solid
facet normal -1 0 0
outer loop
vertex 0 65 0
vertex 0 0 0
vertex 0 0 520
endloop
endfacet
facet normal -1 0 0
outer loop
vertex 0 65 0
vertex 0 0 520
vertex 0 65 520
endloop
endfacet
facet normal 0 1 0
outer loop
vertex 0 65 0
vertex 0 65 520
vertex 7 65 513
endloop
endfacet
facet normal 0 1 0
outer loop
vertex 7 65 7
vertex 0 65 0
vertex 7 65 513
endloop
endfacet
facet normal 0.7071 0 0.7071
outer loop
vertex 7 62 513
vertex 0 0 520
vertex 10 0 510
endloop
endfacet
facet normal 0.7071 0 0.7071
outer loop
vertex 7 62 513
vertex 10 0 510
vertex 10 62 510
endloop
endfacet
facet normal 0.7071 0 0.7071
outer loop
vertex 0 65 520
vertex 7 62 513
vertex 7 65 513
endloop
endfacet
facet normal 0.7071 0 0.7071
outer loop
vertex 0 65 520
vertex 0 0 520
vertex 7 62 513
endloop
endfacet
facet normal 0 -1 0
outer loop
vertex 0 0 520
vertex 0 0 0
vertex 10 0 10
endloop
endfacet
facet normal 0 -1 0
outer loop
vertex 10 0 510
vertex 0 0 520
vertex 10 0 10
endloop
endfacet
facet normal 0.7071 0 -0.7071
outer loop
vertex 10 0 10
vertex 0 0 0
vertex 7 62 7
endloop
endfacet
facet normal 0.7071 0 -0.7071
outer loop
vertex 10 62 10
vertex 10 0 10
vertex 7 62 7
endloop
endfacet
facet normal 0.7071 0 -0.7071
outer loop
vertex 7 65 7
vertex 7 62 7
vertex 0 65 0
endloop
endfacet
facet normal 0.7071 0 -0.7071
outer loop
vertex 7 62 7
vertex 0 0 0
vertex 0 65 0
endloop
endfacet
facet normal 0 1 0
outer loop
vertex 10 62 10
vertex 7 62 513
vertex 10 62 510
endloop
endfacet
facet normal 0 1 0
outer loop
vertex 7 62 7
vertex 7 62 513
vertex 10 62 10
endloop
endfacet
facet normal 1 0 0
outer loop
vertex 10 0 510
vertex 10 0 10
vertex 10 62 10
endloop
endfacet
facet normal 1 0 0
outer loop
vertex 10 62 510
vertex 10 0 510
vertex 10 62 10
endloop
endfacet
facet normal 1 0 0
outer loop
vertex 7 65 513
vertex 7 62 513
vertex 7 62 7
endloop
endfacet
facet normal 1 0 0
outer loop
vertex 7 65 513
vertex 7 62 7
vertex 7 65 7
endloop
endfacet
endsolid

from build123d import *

# Parameters (mm, degrees)
ESQUISSE1_W             = 10
ESQUISSE1_H             = 65
BOSS_EXTRU_1_DEPTH      = 520
CHANFREIN1_SIZE         = 10
ESQUISSE2_W             = 3
ESQUISSE2_H             = 3
ENL_V_MAT_EXTRU_1_DEPTH = 525.14215629


with BuildPart() as part:
    # Esquisse1 → Boss.-Extru.1 (new body)
    with BuildSketch(Plane.XY):
        with Locations((5, 32.5)):
            Rectangle(ESQUISSE1_W, ESQUISSE1_H)
    extrude(amount=BOSS_EXTRU_1_DEPTH)

    # Chanfrein1
    chanfrein1_edges = [part.edges().sort_by_distance(p)[0] for p in [
        (10, 32.5, 520),
        (10, 32.5, 0),
    ]]
    chamfer(chanfrein1_edges, length=CHANFREIN1_SIZE - 0.0001)  # a hair under: the kernel refuses the full size

    # Esquisse2 → Enlèv. mat.-Extru.1 (cut, through all)
    with BuildSketch(Plane.XY):
        with Locations((8.5, 63.5)):
            Rectangle(ESQUISSE2_W, ESQUISSE2_H)
    extrude(amount=ENL_V_MAT_EXTRU_1_DEPTH, mode=Mode.SUBTRACT)


solid = part.part
